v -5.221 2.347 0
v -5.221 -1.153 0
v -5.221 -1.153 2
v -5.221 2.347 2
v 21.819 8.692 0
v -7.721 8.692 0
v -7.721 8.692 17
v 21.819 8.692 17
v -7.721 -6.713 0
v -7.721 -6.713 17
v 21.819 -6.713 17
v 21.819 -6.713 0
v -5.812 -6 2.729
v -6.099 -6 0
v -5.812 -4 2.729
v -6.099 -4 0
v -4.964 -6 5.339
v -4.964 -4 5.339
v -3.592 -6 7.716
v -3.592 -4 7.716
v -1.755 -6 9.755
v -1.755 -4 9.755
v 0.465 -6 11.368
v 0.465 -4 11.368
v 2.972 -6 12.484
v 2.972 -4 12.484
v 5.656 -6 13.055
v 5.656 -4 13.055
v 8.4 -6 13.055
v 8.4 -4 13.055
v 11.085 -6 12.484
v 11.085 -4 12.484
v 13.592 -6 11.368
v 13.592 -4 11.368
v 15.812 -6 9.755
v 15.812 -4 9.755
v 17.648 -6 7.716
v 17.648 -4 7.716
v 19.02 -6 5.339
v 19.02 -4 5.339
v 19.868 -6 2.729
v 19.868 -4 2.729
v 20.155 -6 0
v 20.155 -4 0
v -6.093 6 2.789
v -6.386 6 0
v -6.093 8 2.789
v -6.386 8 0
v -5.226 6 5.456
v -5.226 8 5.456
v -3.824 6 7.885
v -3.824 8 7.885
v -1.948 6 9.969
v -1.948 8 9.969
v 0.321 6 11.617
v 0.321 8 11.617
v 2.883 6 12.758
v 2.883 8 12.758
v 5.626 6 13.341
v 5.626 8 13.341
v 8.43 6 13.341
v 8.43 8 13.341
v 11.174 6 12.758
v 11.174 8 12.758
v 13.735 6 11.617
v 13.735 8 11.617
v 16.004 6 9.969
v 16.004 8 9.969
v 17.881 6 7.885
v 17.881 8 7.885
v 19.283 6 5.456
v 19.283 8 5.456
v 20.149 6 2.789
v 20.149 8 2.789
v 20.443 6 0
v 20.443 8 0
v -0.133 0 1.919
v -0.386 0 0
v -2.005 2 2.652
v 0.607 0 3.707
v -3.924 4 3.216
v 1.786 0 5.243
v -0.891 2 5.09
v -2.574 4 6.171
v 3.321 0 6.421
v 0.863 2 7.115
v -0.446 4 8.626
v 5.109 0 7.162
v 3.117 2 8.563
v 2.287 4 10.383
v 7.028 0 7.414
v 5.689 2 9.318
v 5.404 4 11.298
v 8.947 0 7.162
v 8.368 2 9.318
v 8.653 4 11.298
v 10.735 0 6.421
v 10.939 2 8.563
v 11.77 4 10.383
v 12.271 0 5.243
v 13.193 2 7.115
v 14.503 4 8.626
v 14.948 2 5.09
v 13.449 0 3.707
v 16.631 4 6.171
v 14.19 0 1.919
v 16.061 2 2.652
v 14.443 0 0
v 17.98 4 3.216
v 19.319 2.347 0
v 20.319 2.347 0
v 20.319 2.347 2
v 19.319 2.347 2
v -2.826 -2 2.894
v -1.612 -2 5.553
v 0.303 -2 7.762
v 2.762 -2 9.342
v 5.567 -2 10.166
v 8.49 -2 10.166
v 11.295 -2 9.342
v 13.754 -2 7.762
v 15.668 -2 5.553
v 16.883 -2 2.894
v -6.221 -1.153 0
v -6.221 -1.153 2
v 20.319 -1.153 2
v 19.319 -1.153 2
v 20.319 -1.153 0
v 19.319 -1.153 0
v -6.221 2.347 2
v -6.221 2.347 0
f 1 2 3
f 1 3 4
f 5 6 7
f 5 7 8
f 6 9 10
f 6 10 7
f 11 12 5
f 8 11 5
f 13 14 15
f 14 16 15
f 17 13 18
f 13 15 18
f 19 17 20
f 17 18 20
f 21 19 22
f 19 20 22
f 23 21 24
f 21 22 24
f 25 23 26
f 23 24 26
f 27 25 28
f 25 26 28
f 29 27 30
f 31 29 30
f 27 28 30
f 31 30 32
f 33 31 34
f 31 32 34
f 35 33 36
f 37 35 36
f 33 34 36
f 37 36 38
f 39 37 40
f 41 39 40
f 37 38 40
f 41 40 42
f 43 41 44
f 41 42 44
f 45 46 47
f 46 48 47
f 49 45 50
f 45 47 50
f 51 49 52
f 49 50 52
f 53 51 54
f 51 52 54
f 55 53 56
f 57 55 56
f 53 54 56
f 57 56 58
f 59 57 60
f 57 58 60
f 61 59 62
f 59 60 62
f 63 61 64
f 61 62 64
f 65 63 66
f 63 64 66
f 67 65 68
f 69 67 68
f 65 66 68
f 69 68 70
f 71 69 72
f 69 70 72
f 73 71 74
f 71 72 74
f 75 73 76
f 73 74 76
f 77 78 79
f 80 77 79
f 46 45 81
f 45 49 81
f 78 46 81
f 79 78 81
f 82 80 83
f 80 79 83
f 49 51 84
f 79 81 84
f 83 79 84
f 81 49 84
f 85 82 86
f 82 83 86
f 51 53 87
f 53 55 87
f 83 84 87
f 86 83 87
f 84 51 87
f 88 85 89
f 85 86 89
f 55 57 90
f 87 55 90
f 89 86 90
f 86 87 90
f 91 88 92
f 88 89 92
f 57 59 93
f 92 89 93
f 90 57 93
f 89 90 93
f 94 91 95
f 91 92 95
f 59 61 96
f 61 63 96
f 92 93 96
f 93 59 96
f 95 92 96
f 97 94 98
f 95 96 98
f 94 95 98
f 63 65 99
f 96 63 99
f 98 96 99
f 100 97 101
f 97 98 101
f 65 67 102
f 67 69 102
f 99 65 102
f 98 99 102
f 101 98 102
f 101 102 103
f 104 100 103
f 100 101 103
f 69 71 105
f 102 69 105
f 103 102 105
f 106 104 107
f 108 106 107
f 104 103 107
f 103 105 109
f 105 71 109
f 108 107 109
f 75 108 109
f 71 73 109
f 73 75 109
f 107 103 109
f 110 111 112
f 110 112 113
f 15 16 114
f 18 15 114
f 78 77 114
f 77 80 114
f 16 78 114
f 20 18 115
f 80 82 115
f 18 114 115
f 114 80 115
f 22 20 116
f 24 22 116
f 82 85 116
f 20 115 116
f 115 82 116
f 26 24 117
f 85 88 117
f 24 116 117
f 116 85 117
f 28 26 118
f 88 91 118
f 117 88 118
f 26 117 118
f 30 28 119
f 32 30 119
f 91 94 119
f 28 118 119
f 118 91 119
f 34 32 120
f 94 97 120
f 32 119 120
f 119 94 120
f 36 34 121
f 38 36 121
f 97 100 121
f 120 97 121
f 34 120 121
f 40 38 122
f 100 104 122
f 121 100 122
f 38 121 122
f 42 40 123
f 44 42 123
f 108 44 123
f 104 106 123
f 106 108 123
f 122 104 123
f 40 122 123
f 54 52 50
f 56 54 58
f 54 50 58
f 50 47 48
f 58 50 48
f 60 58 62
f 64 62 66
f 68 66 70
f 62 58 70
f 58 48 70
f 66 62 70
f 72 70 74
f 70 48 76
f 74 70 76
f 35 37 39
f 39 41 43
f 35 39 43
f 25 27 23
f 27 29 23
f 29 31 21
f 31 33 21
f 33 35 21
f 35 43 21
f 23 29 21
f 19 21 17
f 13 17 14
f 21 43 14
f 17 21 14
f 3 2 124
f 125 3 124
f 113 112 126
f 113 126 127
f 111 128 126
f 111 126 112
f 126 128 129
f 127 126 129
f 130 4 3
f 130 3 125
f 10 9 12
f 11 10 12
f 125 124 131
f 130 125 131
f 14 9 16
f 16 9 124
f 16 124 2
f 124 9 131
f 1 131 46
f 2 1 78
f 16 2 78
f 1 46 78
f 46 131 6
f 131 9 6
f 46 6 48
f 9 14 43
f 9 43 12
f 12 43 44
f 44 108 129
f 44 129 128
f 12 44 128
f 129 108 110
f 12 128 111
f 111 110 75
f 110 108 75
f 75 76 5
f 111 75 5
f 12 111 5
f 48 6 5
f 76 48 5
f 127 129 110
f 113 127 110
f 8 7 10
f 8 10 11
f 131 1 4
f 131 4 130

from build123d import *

# Parameters (mm, degrees)
SKETCH1_W           = 29.53979912
SKETCH1_H           = 15.405724453
BOSS_EXTRUDE1_DEPTH = 17
SKETCH3_W           = 1
SKETCH3_H           = 3.5
CUT_EXTRUDE2_DEPTH  = 2


# Read off the part's stored shape, not the designer's step: Cavity1
with BuildPart() as part:
    # Sketch1 → Boss-Extrude1 (new body)
    with BuildSketch(Plane.XY):
        with Locations((7.049151698, 0.989576641)):
            Rectangle(SKETCH1_W, SKETCH1_H)
    extrude(amount=BOSS_EXTRUDE1_DEPTH)

    # Cavity1 outline → Cavity1 (revolve, cut)
    with BuildSketch(Plane(origin=(7.02830498, 0, 0), x_dir=(1, 0, 0), z_dir=(0, 0, 1))):
        Polygon((13.126805589, -4), (7.414213562, 0), (13.414213562, 6), (13.414213562, 8), (0, 8), (0, -6), (13.126805589, -6), align=None)
    revolve(axis=Axis((7.02830498, 0, 0), (0, 1, 0)), mode=Mode.SUBTRACT)

    # Sketch3 → Cut-Extrude2 (cut)
    with BuildSketch(Plane(origin=(0, 0, 0), x_dir=(-1, 0, 0), z_dir=(0, 0, -1))):
        with Locations((-19.819051258, 0.597141886)):
            Rectangle(SKETCH3_W, SKETCH3_H)
        with Locations((5.720747862, 0.597141886)):
            Rectangle(SKETCH3_W, SKETCH3_H)
    extrude(amount=-CUT_EXTRUDE2_DEPTH, mode=Mode.SUBTRACT)


solid = part.part
